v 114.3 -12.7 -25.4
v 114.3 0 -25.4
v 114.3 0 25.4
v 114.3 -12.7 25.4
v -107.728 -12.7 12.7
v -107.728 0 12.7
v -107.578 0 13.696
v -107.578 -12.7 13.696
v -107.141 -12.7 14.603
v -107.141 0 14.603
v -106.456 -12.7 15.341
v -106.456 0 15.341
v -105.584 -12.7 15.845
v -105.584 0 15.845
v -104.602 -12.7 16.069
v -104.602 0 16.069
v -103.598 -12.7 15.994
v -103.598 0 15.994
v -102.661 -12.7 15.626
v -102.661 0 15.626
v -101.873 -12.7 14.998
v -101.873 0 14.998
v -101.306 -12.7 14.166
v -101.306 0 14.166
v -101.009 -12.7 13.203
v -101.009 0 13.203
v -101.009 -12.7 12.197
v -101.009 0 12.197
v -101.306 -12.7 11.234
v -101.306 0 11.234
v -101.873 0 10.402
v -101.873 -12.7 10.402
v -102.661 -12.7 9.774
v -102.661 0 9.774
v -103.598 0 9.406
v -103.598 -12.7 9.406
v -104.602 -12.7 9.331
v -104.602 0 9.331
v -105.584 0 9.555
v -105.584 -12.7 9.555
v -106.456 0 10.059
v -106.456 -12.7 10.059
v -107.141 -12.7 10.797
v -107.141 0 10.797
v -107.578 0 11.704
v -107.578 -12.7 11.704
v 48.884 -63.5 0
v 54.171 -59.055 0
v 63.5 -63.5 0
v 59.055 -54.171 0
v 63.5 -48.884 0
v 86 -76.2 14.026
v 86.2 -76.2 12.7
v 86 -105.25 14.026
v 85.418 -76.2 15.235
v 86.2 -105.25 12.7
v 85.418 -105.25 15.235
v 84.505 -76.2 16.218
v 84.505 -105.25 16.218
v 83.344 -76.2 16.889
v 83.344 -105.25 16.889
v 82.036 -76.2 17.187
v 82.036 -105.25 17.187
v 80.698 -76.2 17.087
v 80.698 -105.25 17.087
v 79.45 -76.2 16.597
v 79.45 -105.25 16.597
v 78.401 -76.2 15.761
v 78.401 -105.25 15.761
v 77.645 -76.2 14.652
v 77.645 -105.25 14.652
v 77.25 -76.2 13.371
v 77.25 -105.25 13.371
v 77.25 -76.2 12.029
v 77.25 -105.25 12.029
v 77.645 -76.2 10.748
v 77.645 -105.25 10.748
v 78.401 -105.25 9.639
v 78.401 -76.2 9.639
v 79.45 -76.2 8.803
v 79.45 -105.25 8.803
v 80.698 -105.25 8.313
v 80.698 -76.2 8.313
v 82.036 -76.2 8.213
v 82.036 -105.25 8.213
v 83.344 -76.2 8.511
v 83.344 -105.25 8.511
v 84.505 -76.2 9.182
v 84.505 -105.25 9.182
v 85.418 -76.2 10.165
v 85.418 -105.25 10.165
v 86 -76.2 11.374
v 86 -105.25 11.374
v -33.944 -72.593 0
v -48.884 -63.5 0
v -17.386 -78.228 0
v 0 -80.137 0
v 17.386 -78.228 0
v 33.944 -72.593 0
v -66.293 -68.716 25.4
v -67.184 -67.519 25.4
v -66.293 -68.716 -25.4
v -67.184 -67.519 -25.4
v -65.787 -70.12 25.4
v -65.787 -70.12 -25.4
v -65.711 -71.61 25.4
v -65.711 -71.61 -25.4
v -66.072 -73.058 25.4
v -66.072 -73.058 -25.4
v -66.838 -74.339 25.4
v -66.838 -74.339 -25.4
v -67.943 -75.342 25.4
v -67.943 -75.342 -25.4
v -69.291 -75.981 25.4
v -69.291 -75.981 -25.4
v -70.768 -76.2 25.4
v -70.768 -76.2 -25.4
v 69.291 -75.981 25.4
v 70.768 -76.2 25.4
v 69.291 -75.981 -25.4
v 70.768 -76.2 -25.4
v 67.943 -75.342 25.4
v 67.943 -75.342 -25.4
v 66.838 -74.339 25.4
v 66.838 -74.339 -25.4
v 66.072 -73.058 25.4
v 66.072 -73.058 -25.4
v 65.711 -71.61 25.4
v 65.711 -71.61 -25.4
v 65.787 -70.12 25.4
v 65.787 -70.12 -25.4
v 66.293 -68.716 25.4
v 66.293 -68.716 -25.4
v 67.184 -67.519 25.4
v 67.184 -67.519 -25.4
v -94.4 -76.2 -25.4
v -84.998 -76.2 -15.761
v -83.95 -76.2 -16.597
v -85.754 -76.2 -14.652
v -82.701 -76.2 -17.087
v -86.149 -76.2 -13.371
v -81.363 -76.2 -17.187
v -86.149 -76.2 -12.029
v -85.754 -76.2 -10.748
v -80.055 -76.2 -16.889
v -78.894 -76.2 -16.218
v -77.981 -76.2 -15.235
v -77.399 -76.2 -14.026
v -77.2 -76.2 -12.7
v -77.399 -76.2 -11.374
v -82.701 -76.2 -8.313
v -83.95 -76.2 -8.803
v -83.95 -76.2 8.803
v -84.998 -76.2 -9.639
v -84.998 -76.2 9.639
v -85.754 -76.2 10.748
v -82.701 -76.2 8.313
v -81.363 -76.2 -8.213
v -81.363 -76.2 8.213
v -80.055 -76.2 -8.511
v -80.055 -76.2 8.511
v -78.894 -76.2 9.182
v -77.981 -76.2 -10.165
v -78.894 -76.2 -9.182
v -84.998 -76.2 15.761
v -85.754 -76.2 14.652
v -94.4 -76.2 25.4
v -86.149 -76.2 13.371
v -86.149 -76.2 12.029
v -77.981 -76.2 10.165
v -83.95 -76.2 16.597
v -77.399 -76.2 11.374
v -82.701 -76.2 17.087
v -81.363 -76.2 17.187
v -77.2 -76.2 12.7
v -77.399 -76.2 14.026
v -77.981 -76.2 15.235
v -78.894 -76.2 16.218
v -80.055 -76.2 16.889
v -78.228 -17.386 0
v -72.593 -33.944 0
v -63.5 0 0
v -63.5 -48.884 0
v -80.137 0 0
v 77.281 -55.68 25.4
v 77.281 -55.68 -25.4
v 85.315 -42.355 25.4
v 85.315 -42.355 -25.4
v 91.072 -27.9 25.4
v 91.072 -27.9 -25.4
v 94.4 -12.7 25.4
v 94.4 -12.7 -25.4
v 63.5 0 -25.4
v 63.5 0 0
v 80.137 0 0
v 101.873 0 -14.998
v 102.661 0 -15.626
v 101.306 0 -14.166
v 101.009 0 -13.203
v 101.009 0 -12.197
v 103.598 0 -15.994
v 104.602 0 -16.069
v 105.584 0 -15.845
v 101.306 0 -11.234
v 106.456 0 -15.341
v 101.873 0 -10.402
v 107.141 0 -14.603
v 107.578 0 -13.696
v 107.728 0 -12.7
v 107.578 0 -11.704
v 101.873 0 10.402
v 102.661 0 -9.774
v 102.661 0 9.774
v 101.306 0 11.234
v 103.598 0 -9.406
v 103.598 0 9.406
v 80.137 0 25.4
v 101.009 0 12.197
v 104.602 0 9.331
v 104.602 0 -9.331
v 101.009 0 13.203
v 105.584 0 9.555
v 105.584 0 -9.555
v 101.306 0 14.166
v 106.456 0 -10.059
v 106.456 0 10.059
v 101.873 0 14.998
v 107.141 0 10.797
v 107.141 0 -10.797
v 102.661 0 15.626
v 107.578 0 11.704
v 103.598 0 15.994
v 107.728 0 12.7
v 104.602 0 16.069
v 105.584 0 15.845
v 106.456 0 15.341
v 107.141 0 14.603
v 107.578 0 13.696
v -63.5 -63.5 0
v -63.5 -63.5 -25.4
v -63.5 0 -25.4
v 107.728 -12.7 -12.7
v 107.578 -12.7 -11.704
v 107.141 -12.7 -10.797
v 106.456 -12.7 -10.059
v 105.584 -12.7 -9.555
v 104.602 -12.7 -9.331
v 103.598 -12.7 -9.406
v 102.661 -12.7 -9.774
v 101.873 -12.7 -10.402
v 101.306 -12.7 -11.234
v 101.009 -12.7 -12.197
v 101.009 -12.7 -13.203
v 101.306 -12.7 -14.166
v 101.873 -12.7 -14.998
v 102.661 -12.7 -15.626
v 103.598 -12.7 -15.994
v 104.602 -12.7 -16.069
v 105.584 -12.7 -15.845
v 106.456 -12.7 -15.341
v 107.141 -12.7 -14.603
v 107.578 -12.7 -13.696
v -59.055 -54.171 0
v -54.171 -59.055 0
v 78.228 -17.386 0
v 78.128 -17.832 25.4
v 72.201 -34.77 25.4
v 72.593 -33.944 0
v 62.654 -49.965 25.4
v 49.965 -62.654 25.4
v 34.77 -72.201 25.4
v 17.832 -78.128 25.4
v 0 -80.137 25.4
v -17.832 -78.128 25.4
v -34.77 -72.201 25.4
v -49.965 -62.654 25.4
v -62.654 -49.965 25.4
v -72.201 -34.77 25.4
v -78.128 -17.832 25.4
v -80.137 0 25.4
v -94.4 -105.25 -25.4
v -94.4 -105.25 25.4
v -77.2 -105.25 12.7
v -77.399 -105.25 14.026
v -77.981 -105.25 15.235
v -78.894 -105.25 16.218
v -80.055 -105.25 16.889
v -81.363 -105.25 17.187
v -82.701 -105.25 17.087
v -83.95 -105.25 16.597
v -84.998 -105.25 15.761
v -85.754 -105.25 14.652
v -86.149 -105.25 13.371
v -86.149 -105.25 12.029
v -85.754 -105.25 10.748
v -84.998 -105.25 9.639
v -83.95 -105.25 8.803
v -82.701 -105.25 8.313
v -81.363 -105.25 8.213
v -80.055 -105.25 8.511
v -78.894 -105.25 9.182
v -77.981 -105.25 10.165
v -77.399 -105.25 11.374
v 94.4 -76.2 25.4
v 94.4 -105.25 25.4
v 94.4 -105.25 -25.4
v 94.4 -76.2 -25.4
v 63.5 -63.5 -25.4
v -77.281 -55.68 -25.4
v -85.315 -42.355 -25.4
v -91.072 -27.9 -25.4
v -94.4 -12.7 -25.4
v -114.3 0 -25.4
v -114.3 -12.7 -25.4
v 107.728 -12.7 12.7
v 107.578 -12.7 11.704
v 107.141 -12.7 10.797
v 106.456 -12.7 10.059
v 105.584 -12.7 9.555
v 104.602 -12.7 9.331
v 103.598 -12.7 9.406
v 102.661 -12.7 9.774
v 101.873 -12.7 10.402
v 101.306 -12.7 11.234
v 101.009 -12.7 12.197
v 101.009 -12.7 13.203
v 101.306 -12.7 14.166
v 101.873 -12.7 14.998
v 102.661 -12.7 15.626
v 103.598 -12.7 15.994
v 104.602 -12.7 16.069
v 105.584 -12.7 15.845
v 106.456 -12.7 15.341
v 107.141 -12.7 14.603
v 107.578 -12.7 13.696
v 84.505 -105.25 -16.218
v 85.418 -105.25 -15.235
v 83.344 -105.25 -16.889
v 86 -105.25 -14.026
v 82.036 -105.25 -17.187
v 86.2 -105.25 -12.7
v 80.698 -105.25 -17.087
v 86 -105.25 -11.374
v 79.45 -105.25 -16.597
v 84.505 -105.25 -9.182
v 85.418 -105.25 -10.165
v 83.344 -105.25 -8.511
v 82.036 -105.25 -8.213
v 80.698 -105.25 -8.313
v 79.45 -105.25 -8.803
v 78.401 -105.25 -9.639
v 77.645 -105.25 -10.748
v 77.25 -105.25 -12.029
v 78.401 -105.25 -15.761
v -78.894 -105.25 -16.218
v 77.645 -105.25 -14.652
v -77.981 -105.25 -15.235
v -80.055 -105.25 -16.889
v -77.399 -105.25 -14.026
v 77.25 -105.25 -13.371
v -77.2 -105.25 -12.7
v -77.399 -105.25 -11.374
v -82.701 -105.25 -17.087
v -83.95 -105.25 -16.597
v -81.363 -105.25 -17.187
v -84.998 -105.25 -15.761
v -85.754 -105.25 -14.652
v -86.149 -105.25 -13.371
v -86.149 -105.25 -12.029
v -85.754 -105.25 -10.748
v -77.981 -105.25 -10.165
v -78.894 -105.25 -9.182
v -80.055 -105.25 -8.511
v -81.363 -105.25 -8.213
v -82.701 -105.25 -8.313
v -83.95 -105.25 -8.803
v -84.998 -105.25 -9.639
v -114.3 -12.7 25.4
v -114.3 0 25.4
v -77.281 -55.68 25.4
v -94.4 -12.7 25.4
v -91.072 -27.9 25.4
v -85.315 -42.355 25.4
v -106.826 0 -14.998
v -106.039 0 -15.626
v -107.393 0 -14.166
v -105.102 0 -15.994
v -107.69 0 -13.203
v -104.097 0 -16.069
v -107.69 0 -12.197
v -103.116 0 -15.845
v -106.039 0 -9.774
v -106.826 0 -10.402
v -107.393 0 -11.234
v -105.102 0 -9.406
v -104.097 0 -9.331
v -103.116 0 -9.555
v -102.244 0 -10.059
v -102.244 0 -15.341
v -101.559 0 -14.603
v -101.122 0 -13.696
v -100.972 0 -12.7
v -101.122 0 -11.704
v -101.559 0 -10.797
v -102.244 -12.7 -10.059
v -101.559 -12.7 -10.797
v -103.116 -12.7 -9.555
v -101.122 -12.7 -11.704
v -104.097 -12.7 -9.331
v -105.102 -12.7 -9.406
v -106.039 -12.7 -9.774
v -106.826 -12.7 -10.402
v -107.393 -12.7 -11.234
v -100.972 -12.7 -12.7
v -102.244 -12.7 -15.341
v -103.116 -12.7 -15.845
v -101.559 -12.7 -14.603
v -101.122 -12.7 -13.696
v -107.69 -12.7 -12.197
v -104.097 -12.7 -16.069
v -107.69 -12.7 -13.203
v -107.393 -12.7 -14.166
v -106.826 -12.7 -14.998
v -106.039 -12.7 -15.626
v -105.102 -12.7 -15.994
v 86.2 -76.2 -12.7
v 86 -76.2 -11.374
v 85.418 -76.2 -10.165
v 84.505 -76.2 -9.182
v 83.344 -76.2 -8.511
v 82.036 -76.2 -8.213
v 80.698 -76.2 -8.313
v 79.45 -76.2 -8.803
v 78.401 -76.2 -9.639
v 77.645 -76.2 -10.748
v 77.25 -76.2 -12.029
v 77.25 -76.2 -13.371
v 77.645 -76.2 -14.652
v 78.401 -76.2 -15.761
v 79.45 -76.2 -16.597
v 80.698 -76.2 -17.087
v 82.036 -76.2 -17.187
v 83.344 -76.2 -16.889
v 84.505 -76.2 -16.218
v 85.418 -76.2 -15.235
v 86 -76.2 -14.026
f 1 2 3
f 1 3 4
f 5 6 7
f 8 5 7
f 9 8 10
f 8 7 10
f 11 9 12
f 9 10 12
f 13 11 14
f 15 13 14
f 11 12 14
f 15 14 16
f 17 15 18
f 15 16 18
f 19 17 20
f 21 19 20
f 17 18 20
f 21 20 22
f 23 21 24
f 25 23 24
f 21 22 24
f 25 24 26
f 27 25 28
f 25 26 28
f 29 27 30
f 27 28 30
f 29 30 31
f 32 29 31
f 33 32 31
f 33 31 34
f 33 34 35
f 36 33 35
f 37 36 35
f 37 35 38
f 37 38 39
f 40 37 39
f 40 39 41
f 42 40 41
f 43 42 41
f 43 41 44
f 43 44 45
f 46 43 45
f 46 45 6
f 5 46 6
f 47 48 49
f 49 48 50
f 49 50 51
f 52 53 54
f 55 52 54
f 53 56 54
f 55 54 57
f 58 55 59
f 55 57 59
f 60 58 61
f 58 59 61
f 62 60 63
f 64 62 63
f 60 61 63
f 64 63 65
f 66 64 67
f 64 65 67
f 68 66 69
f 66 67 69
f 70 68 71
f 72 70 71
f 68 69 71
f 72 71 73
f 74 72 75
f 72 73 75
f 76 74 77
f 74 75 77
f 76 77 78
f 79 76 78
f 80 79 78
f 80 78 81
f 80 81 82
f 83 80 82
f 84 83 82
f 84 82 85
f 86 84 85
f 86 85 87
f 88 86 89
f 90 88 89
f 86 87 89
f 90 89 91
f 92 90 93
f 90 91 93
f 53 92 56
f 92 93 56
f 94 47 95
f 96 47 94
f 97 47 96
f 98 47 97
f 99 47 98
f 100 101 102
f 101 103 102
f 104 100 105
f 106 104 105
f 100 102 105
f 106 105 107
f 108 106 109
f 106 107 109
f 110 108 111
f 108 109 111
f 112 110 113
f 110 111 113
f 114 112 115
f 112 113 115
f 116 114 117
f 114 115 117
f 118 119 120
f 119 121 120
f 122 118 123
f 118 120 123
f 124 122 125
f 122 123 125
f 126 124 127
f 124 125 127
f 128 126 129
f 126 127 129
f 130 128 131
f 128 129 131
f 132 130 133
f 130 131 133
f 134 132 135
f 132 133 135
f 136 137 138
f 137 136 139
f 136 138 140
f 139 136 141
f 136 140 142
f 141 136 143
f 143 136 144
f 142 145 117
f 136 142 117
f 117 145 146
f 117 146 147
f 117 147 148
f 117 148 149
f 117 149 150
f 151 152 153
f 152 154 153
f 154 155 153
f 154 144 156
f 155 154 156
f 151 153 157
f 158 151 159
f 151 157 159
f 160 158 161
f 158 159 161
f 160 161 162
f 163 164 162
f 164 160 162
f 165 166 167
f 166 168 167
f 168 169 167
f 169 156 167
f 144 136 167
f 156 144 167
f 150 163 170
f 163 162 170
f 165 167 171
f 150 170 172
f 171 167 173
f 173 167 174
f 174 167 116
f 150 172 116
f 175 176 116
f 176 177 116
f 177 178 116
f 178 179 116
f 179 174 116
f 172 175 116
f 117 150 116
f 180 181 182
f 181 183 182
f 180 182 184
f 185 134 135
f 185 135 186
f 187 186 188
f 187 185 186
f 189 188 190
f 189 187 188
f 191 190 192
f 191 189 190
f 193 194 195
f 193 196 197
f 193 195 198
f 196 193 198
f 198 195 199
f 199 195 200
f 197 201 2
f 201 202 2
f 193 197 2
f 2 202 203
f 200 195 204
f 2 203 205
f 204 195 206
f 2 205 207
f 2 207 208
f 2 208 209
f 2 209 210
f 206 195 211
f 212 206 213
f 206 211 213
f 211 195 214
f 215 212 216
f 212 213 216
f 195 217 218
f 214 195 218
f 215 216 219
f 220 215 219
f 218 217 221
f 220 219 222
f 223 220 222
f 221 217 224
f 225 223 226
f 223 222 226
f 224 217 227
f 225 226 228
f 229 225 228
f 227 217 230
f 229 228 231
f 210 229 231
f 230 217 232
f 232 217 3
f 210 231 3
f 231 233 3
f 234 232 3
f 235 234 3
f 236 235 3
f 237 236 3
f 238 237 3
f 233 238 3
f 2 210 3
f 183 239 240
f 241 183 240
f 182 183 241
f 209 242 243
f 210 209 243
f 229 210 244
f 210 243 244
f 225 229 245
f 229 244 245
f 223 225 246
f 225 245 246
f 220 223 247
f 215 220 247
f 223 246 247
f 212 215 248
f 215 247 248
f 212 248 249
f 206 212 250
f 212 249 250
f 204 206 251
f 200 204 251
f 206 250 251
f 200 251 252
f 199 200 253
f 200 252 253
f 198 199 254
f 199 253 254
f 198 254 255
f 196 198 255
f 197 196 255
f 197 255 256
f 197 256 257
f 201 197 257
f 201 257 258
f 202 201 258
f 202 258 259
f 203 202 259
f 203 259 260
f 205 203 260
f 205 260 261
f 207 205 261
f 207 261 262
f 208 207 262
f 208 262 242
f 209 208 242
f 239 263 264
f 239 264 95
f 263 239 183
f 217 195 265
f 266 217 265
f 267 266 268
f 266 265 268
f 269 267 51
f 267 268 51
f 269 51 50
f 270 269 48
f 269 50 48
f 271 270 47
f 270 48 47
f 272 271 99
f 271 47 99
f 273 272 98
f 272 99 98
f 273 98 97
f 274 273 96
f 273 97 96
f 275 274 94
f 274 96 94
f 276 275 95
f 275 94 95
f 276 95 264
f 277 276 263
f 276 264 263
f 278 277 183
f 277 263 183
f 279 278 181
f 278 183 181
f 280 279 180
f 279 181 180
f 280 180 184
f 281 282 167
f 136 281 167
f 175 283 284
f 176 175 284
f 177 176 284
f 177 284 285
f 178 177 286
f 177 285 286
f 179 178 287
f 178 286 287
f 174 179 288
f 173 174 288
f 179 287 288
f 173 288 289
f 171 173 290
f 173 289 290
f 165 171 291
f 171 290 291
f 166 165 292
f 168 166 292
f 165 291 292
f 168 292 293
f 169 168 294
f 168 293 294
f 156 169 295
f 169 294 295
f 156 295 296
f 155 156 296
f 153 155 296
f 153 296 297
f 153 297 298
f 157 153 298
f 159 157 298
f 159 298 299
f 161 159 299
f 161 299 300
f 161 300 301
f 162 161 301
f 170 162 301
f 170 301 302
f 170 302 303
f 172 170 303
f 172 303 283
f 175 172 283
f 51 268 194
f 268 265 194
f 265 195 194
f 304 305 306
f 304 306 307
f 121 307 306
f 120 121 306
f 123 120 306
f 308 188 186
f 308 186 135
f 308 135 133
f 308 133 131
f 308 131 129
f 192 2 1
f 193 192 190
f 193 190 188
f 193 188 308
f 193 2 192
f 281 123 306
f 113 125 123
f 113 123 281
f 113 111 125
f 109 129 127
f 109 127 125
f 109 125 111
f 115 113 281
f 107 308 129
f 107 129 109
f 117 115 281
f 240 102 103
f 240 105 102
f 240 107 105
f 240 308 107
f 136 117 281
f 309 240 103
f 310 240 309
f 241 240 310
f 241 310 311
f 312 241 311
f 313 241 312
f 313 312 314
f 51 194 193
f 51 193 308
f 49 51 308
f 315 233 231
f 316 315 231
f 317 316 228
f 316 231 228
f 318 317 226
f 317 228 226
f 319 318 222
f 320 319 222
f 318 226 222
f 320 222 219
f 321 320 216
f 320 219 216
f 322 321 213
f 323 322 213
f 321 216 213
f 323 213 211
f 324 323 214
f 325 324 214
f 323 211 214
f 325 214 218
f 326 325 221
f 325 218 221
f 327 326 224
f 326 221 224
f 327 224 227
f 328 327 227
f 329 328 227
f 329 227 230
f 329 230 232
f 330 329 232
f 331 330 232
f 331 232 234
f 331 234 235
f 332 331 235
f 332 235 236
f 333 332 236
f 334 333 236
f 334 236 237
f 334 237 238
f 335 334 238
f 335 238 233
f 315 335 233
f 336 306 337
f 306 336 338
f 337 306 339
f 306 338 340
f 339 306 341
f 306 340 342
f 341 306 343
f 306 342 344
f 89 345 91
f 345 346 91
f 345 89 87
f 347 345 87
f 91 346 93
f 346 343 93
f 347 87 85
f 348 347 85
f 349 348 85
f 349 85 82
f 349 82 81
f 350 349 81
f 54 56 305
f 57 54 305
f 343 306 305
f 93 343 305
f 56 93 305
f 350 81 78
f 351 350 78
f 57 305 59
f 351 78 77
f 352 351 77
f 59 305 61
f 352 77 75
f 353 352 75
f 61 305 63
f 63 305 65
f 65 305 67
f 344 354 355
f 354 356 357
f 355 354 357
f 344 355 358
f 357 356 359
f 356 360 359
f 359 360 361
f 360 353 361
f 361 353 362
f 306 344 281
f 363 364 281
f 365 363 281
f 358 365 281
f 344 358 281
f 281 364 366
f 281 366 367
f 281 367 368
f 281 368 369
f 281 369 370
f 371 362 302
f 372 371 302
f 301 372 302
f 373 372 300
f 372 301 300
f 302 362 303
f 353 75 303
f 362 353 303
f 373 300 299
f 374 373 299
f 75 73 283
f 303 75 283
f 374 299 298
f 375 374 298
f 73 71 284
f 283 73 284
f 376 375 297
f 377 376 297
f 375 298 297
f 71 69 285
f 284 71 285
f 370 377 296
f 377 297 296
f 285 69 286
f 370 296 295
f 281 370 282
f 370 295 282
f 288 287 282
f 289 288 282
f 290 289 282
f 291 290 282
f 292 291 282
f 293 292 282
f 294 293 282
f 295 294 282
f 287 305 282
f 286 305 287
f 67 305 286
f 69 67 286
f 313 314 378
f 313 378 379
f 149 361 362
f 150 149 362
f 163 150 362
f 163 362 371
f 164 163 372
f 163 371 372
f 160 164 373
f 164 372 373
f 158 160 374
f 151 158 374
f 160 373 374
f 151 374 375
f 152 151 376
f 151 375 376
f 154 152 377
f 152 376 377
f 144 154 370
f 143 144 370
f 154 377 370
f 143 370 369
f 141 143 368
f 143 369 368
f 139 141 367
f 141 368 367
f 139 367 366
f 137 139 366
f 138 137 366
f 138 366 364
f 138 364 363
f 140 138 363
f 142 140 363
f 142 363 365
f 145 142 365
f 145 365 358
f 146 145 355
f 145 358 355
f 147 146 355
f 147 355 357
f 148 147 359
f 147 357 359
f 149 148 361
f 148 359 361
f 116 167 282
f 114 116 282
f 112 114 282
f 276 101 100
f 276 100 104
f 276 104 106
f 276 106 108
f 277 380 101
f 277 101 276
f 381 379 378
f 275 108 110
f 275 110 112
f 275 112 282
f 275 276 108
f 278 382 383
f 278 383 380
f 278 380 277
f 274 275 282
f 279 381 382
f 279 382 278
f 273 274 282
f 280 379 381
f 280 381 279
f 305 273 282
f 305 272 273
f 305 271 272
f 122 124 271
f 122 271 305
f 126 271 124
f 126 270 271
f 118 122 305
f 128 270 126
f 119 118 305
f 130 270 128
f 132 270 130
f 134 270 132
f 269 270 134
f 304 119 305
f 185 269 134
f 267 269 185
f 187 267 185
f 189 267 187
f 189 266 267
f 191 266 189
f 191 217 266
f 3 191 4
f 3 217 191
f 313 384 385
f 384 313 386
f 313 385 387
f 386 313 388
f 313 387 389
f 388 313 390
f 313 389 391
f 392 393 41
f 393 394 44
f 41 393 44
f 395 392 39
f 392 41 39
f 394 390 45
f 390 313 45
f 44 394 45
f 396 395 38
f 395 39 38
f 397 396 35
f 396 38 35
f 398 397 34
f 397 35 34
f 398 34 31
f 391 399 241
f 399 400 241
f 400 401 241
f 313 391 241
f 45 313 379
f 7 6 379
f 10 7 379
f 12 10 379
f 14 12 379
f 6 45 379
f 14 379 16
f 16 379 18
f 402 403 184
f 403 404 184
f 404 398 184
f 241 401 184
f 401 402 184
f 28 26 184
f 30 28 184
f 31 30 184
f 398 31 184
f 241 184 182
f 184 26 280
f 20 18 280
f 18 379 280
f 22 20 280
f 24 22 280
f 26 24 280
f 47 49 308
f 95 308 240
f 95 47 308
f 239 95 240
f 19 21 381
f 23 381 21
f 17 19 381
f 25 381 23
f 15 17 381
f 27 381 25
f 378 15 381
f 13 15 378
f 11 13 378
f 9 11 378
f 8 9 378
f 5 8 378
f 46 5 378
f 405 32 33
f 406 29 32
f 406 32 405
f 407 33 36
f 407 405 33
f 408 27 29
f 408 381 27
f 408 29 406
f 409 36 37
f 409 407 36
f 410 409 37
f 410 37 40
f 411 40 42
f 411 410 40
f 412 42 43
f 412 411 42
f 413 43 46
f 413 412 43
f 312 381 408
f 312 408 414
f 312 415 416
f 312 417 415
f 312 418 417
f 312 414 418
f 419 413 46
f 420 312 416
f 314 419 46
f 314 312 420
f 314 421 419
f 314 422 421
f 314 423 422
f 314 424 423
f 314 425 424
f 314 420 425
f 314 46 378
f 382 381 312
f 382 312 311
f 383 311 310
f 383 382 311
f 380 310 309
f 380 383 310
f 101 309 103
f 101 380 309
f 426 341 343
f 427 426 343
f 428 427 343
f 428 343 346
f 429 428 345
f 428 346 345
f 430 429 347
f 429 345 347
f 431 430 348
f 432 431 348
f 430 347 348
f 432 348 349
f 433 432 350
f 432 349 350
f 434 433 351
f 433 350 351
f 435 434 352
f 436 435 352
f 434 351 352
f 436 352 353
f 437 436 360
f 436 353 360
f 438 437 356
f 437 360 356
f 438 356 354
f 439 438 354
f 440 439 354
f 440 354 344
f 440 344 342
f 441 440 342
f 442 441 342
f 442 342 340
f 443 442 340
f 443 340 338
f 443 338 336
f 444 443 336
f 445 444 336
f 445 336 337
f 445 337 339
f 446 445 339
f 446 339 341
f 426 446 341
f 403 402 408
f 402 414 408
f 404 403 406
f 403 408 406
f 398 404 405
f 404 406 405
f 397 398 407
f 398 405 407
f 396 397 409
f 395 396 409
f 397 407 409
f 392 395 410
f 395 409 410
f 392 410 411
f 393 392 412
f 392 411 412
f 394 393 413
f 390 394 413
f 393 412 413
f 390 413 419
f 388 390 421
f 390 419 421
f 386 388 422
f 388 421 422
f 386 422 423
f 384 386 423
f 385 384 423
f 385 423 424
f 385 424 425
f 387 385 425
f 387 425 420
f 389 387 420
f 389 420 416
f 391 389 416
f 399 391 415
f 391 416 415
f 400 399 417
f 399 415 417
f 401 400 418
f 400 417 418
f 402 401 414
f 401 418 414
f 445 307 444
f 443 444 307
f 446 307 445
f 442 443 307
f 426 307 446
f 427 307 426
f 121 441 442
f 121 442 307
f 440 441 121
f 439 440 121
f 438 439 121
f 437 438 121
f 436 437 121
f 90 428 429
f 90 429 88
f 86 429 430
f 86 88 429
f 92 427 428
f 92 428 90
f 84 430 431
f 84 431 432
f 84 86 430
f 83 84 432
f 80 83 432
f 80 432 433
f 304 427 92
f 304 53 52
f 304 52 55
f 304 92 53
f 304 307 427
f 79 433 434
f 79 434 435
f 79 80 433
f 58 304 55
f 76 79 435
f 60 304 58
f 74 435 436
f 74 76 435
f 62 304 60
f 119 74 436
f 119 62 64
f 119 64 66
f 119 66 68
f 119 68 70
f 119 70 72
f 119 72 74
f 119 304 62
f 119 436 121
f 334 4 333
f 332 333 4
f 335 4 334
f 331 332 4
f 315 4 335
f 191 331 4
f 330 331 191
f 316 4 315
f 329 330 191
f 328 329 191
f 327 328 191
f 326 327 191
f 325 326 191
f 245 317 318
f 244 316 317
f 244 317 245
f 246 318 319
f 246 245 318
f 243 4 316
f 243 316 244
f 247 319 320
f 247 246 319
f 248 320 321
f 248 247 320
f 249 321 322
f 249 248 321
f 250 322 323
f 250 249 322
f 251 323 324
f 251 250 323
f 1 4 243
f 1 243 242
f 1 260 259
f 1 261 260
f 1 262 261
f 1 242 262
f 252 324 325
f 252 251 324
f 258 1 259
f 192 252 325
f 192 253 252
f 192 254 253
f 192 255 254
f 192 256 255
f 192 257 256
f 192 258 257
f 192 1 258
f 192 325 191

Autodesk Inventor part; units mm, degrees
ref_plane "YZ Plane" through (0, 0, 0) normal (1, 0, 0) x (0, 1, 0)
ref_plane "XZ Plane" through (0, 0, 0) normal (0, 1, 0) x (-1, 0, 0)
ref_plane "XY Plane" through (0, 0, 0) normal (0, 0, 1) x (1, 0, 0)
sketch "Sketch1" plane through (0, 0, 0) normal (0, 0, 1) x (1, 0, 0)
  circle A0 centre (0, 0) radius 80.137
  line L0 (-114.3, -12.7) -> (-114.3, 12.7)
  line L1 (114.3, 12.7) -> (114.3, -12.7)
  line L2 (114.3, -12.7) -> (-114.3, 12.7) construction
  line L3 (-114.3, -12.7) -> (114.3, 12.7) construction
  line L4 (-114.3, 0) -> (95.25, 0) construction
  line L5 (-114.3, 12.7) -> (-94.3995, 12.7)
  line L6 (94.3995, 12.7) -> (114.3, 12.7)
  arc A1 (-94.3995, -12.7) -> (94.3995, -12.7) centre (0, 0) ccw
  arc A2 (94.3995, 12.7) -> (-94.3995, 12.7) centre (0, 0) ccw
  line L7 (114.3, -12.7) -> (94.3995, -12.7)
  line L8 (-94.3995, -12.7) -> (-114.3, -12.7)
  dimension "d0" = 160.274
  dimension "d2" = 228.6
  dimension "d3" = 25.4
extrude "Extrusion1" add sketch "Sketch1" along normal blind 25.4
sketch "Sketch2" plane through (94.3995, 12.7, 0) normal (0, 1, 0) x (1, 0, 0)
  line L0 (19.9005, 0) -> (0, 0) projected
  line L1 (0, 0) -> (0, -25.4) projected
  line L2 (19.9005, -25.4) -> (0, -25.4) projected
  line L3 (19.9005, 0) -> (19.9005, -25.4) projected
  line L4 (19.9005, -12.7) -> (0, -12.7) construction
  line L5 (9.9502, -25.4) -> (9.9502, 0) construction
  circle A0 centre (9.9502, -12.7) radius 3.3782
  point P0 (-94.3995, 0)
  dimension "d6" = 6.7564
extrude "Extrusion2" cut sketch "Sketch2" against normal blind 38.1 contours A0
sketch "Sketch3" plane through (94.3995, 12.7, 0) normal (0, 1, 0) x (1, 0, 0)
  circle A0 centre (9.9502, -12.7) radius 3.175
  line L0 (9.9502, -4.8005) -> (16.7914, -8.7502)
  line L1 (16.7914, -8.7502) -> (16.7914, -16.6498)
  line L2 (16.7914, -16.6498) -> (9.9502, -20.5995)
  line L3 (9.9502, -20.5995) -> (3.1091, -16.6498)
  line L4 (3.1091, -16.6498) -> (3.1091, -8.7502)
  line L5 (3.1091, -8.7502) -> (9.9502, -4.8005)
  point P0 (-94.3995, 0)
extrude "Extrusion3" [suppressed]
mirror "Mirror1" about plane through (0, 0, 0) normal (1, 0, 0) of "Extrusion2"
sketch "Sketch6" plane through (0, 0, 25.4) normal (0, 0, 1) x (1, 0, 0)
  line L0 (-63.5, -63.5) -> (-63.5, 63.5) construction
  line L1 (-63.5, 63.5) -> (63.5, 63.5) construction
  line L2 (63.5, 63.5) -> (63.5, -63.5) construction
  line L3 (63.5, -63.5) -> (-63.5, -63.5) construction
  line L4 (-94.3995, 94.3995) -> (-63.5, 63.5) construction
  line L5 (63.5, 63.5) -> (94.3995, 94.3995) construction
  line L6 (63.5, -63.5) -> (94.3995, -94.3995) construction
  line L7 (-63.5, -63.5) -> (63.5, -63.5) construction
  line L8 (-63.5, -63.5) -> (-94.3995, -94.3995) construction
  point P0 (-78.9498, 78.9498)
  point P1 (78.9498, 78.9498)
  point P2 (78.9498, -78.9498)
  point P3 (-78.9498, -78.9498)
hole "Hole1" [suppressed]
sketch "Sketch9" plane through (0, 0, 25.4) normal (0, 0, 1) x (1, 0, 0)
  line L0 (114.3, -12.7) -> (114.3, 12.7) projected
  line L1 (114.3, 12.7) -> (94.3995, 12.7) projected
  line L2 (94.3995, 12.7) -> (94.3995, 94.3995) projected
  line L3 (94.3995, 94.3995) -> (12.7, 94.3995) projected
  arc A0 (94.3995, 12.7) -> (-94.3995, 12.7) centre (0, 0) ccw projected
  line L4 (-12.7, 94.3995) -> (-94.3995, 94.3995) projected
  line L5 (-94.3995, 94.3995) -> (-94.3995, 12.7) projected
  line L6 (-94.3995, 12.7) -> (-114.3, 12.7) projected
  line L7 (-114.3, 12.7) -> (-114.3, -12.7) projected
  line L8 (-114.3, 0) -> (114.3, 0)
extrude "Extrusion7" cut sketch "Sketch9" against normal blind 25.4
sketch "Sketch10" plane through (0, 0, 0) normal (0, 0, -1) x (-1, 0, 0)
  arc A0 (-94.3995, -12.7) -> (94.3995, -12.7) centre (0, 0) ccw projected
  line L0 (-63.5, -63.5) -> (63.5, -63.5)
  line L1 (63.5, -63.5) -> (63.5, 63.5)
  line L2 (63.5, 63.5) -> (-63.5, 63.5)
  line L3 (-63.5, 63.5) -> (-63.5, -63.5)
  line L4 (-63.5, -63.5) -> (63.5, 63.5) construction
  line L5 (63.5, -63.5) -> (-63.5, 63.5) construction
  circle A1 centre (0, 0) radius 95.25
  dimension "d58" = 127
  dimension "d59" = 127
extrude "Extrusion8" add sketch "Sketch10" along normal blind 25.4
sketch "Sketch12" plane through (0, 0, 0) normal (0, 0, 1) x (1, 0, 0)
  line L0 (-80.137, 0) -> (-114.3, 0) projected
  line L1 (-114.3, 0) -> (111.125, 0)
  line L2 (111.125, 0) -> (111.125, 104.775)
  line L3 (111.125, 104.775) -> (-114.3, 104.775)
  line L4 (-114.3, 104.775) -> (-114.3, 0)
  point P0 (0, 0)
  point P1 (-83.312, 0)
extrude "Extrusion10" cut sketch "Sketch12" against normal blind 25.4
sketch "Sketch14" plane through (0, 0, 25.4) normal (0, 0, 1) x (1, 0, 0)
  line L0 (80.137, 0) -> (63.5, 0) projected
  line L1 (-114.3, -12.7) -> (-94.3995, -12.7) projected
  line L2 (94.3995, -105.25) -> (-94.3995, -105.25)
  line L3 (0, -95.25) -> (-39.6875, -95.25)
  arc A0 (-94.3995, -12.7) -> (94.3995, -12.7) centre (0, 0) ccw
  line L4 (94.3995, -76.2) -> (57.15, -76.2)
  line L5 (-94.3995, -76.2) -> (-57.15, -76.2)
  arc A1 (-57.15, -76.2) -> (57.15, -76.2) centre (0, 0) ccw
  line L6 (94.3995, -105.25) -> (94.3995, -76.2)
  line L7 (-94.3995, -105.25) -> (-94.3995, -76.2)
  point P0 (-80.137, 0)
  dimension "d74" = 10
extrude "Extrusion11" add sketch "Sketch14" against normal up to surface (50.8 mm away)
fillet "Fillet1" radius 5.08 4 edges at (-57.15, -76.2, 12.7) (-57.15, -76.2, -12.7) (57.15, -76.2, 12.7) (57.15, -76.2, -12.7)
sketch "Sketch16" plane through (-94.3995, -105.25, 25.4) normal (0, -1, 0) x (1, 0, 0)
  circle A0 centre (12.7, -38.1) radius 4.5
  line L0 (0, 0) -> (0, -50.8) projected
  line L1 (188.7991, -50.8) -> (0, -50.8) projected
  circle A1 centre (12.7, -12.7) radius 4.5
  line L2 (0, 0) -> (188.7991, 0) projected
  circle A2 centre (176.0991, -38.1) radius 4.5
  circle A3 centre (176.0991, -12.7) radius 4.5
  line L3 (188.7991, 0) -> (188.7991, -50.8) projected
  point P0 (94.3995, -25.4)
  dimension "d76" = 9
  dimension "d77" = 12.7
  dimension "d78" = 12.7
  dimension "d79" = 9
  dimension "d80" = 12.7
  dimension "d81" = 12.7
  dimension "d82" = 9
  dimension "d83" = 9
  dimension "d84" = 12.7
  dimension "d85" = 12.7
  dimension "d88" = 12.7
  dimension "d89" = 12.7
extrude "Extrusion12" cut sketch "Sketch16" against normal up to surface (29.05 mm away) contours A0 | A1 | A2 | A3
sketch "Sketch17" plane through (0, 0, 0) normal (0, 0, -1) x (-1, 0, 0)
  arc A0 (-95.25, 0) -> (-94.3995, -12.7) centre (0, 0) ccw projected
  line L0 (-95.25, 0) -> (-114.3, 0) projected
  line L1 (-114.3, -12.7) -> (-114.3, 0) projected
  line L2 (-94.3995, -12.7) -> (-114.3, -12.7) projected
  arc A1 (94.3995, -12.7) -> (95.25, 0) centre (0, 0) ccw projected
  line L3 (114.3, -12.7) -> (94.3995, -12.7) projected
  line L4 (114.3, 0) -> (114.3, -12.7) projected
  line L5 (114.3, 0) -> (95.25, 0) projected
extrude "Extrusion13" add sketch "Sketch17" along normal blind 25.4
sketch "Sketch18" plane through (-114.3, -12.7, 25.4) normal (0, -1, 0) x (1, 0, 0)
  circle A0 centre (9.9502, -12.7) radius 3.3782 projected
  circle A1 centre (9.9502, -38.1) radius 3.3782
  line L0 (0, 0) -> (19.9005, 0) projected
  line L1 (19.9005, -50.8) -> (0, -50.8) projected
  line L2 (0, -50.8) -> (0, 0) projected
  circle A2 centre (218.6498, -12.7) radius 3.3782 projected
  circle A3 centre (218.6498, -38.1) radius 3.3782
  line L3 (228.6, 0) -> (228.6, -50.8) projected
  line L4 (208.6995, 0) -> (228.6, 0) projected
  line L5 (228.6, -50.8) -> (208.6995, -50.8) projected
  point P0 (114.3, -25.4)
  dimension "d92" = 6.7564
  dimension "d93" = 6.7564
  dimension "d94" = 12.7
  dimension "d95" = 12.7
  dimension "d96" = 9.9502
  dimension "d97" = 9.9502
  dimension "d98" = 6.7564
  dimension "d99" = 9.9502
  dimension "d100" = 12.7
  dimension "d101" = 9.9502
  dimension "d102" = 12.7
  dimension "d103" = 6.7564
extrude "Extrusion14" cut sketch "Sketch18" against normal blind 25.4 contours A1 | A3
equation "\"d36\" = 0.25 * d33"
equation "\"d37\" = d36"
equation "\"d33\" = 9.525"
properties part number "2124_Bearing Clamps NoPulley_V2" material "ABS Plastic"
